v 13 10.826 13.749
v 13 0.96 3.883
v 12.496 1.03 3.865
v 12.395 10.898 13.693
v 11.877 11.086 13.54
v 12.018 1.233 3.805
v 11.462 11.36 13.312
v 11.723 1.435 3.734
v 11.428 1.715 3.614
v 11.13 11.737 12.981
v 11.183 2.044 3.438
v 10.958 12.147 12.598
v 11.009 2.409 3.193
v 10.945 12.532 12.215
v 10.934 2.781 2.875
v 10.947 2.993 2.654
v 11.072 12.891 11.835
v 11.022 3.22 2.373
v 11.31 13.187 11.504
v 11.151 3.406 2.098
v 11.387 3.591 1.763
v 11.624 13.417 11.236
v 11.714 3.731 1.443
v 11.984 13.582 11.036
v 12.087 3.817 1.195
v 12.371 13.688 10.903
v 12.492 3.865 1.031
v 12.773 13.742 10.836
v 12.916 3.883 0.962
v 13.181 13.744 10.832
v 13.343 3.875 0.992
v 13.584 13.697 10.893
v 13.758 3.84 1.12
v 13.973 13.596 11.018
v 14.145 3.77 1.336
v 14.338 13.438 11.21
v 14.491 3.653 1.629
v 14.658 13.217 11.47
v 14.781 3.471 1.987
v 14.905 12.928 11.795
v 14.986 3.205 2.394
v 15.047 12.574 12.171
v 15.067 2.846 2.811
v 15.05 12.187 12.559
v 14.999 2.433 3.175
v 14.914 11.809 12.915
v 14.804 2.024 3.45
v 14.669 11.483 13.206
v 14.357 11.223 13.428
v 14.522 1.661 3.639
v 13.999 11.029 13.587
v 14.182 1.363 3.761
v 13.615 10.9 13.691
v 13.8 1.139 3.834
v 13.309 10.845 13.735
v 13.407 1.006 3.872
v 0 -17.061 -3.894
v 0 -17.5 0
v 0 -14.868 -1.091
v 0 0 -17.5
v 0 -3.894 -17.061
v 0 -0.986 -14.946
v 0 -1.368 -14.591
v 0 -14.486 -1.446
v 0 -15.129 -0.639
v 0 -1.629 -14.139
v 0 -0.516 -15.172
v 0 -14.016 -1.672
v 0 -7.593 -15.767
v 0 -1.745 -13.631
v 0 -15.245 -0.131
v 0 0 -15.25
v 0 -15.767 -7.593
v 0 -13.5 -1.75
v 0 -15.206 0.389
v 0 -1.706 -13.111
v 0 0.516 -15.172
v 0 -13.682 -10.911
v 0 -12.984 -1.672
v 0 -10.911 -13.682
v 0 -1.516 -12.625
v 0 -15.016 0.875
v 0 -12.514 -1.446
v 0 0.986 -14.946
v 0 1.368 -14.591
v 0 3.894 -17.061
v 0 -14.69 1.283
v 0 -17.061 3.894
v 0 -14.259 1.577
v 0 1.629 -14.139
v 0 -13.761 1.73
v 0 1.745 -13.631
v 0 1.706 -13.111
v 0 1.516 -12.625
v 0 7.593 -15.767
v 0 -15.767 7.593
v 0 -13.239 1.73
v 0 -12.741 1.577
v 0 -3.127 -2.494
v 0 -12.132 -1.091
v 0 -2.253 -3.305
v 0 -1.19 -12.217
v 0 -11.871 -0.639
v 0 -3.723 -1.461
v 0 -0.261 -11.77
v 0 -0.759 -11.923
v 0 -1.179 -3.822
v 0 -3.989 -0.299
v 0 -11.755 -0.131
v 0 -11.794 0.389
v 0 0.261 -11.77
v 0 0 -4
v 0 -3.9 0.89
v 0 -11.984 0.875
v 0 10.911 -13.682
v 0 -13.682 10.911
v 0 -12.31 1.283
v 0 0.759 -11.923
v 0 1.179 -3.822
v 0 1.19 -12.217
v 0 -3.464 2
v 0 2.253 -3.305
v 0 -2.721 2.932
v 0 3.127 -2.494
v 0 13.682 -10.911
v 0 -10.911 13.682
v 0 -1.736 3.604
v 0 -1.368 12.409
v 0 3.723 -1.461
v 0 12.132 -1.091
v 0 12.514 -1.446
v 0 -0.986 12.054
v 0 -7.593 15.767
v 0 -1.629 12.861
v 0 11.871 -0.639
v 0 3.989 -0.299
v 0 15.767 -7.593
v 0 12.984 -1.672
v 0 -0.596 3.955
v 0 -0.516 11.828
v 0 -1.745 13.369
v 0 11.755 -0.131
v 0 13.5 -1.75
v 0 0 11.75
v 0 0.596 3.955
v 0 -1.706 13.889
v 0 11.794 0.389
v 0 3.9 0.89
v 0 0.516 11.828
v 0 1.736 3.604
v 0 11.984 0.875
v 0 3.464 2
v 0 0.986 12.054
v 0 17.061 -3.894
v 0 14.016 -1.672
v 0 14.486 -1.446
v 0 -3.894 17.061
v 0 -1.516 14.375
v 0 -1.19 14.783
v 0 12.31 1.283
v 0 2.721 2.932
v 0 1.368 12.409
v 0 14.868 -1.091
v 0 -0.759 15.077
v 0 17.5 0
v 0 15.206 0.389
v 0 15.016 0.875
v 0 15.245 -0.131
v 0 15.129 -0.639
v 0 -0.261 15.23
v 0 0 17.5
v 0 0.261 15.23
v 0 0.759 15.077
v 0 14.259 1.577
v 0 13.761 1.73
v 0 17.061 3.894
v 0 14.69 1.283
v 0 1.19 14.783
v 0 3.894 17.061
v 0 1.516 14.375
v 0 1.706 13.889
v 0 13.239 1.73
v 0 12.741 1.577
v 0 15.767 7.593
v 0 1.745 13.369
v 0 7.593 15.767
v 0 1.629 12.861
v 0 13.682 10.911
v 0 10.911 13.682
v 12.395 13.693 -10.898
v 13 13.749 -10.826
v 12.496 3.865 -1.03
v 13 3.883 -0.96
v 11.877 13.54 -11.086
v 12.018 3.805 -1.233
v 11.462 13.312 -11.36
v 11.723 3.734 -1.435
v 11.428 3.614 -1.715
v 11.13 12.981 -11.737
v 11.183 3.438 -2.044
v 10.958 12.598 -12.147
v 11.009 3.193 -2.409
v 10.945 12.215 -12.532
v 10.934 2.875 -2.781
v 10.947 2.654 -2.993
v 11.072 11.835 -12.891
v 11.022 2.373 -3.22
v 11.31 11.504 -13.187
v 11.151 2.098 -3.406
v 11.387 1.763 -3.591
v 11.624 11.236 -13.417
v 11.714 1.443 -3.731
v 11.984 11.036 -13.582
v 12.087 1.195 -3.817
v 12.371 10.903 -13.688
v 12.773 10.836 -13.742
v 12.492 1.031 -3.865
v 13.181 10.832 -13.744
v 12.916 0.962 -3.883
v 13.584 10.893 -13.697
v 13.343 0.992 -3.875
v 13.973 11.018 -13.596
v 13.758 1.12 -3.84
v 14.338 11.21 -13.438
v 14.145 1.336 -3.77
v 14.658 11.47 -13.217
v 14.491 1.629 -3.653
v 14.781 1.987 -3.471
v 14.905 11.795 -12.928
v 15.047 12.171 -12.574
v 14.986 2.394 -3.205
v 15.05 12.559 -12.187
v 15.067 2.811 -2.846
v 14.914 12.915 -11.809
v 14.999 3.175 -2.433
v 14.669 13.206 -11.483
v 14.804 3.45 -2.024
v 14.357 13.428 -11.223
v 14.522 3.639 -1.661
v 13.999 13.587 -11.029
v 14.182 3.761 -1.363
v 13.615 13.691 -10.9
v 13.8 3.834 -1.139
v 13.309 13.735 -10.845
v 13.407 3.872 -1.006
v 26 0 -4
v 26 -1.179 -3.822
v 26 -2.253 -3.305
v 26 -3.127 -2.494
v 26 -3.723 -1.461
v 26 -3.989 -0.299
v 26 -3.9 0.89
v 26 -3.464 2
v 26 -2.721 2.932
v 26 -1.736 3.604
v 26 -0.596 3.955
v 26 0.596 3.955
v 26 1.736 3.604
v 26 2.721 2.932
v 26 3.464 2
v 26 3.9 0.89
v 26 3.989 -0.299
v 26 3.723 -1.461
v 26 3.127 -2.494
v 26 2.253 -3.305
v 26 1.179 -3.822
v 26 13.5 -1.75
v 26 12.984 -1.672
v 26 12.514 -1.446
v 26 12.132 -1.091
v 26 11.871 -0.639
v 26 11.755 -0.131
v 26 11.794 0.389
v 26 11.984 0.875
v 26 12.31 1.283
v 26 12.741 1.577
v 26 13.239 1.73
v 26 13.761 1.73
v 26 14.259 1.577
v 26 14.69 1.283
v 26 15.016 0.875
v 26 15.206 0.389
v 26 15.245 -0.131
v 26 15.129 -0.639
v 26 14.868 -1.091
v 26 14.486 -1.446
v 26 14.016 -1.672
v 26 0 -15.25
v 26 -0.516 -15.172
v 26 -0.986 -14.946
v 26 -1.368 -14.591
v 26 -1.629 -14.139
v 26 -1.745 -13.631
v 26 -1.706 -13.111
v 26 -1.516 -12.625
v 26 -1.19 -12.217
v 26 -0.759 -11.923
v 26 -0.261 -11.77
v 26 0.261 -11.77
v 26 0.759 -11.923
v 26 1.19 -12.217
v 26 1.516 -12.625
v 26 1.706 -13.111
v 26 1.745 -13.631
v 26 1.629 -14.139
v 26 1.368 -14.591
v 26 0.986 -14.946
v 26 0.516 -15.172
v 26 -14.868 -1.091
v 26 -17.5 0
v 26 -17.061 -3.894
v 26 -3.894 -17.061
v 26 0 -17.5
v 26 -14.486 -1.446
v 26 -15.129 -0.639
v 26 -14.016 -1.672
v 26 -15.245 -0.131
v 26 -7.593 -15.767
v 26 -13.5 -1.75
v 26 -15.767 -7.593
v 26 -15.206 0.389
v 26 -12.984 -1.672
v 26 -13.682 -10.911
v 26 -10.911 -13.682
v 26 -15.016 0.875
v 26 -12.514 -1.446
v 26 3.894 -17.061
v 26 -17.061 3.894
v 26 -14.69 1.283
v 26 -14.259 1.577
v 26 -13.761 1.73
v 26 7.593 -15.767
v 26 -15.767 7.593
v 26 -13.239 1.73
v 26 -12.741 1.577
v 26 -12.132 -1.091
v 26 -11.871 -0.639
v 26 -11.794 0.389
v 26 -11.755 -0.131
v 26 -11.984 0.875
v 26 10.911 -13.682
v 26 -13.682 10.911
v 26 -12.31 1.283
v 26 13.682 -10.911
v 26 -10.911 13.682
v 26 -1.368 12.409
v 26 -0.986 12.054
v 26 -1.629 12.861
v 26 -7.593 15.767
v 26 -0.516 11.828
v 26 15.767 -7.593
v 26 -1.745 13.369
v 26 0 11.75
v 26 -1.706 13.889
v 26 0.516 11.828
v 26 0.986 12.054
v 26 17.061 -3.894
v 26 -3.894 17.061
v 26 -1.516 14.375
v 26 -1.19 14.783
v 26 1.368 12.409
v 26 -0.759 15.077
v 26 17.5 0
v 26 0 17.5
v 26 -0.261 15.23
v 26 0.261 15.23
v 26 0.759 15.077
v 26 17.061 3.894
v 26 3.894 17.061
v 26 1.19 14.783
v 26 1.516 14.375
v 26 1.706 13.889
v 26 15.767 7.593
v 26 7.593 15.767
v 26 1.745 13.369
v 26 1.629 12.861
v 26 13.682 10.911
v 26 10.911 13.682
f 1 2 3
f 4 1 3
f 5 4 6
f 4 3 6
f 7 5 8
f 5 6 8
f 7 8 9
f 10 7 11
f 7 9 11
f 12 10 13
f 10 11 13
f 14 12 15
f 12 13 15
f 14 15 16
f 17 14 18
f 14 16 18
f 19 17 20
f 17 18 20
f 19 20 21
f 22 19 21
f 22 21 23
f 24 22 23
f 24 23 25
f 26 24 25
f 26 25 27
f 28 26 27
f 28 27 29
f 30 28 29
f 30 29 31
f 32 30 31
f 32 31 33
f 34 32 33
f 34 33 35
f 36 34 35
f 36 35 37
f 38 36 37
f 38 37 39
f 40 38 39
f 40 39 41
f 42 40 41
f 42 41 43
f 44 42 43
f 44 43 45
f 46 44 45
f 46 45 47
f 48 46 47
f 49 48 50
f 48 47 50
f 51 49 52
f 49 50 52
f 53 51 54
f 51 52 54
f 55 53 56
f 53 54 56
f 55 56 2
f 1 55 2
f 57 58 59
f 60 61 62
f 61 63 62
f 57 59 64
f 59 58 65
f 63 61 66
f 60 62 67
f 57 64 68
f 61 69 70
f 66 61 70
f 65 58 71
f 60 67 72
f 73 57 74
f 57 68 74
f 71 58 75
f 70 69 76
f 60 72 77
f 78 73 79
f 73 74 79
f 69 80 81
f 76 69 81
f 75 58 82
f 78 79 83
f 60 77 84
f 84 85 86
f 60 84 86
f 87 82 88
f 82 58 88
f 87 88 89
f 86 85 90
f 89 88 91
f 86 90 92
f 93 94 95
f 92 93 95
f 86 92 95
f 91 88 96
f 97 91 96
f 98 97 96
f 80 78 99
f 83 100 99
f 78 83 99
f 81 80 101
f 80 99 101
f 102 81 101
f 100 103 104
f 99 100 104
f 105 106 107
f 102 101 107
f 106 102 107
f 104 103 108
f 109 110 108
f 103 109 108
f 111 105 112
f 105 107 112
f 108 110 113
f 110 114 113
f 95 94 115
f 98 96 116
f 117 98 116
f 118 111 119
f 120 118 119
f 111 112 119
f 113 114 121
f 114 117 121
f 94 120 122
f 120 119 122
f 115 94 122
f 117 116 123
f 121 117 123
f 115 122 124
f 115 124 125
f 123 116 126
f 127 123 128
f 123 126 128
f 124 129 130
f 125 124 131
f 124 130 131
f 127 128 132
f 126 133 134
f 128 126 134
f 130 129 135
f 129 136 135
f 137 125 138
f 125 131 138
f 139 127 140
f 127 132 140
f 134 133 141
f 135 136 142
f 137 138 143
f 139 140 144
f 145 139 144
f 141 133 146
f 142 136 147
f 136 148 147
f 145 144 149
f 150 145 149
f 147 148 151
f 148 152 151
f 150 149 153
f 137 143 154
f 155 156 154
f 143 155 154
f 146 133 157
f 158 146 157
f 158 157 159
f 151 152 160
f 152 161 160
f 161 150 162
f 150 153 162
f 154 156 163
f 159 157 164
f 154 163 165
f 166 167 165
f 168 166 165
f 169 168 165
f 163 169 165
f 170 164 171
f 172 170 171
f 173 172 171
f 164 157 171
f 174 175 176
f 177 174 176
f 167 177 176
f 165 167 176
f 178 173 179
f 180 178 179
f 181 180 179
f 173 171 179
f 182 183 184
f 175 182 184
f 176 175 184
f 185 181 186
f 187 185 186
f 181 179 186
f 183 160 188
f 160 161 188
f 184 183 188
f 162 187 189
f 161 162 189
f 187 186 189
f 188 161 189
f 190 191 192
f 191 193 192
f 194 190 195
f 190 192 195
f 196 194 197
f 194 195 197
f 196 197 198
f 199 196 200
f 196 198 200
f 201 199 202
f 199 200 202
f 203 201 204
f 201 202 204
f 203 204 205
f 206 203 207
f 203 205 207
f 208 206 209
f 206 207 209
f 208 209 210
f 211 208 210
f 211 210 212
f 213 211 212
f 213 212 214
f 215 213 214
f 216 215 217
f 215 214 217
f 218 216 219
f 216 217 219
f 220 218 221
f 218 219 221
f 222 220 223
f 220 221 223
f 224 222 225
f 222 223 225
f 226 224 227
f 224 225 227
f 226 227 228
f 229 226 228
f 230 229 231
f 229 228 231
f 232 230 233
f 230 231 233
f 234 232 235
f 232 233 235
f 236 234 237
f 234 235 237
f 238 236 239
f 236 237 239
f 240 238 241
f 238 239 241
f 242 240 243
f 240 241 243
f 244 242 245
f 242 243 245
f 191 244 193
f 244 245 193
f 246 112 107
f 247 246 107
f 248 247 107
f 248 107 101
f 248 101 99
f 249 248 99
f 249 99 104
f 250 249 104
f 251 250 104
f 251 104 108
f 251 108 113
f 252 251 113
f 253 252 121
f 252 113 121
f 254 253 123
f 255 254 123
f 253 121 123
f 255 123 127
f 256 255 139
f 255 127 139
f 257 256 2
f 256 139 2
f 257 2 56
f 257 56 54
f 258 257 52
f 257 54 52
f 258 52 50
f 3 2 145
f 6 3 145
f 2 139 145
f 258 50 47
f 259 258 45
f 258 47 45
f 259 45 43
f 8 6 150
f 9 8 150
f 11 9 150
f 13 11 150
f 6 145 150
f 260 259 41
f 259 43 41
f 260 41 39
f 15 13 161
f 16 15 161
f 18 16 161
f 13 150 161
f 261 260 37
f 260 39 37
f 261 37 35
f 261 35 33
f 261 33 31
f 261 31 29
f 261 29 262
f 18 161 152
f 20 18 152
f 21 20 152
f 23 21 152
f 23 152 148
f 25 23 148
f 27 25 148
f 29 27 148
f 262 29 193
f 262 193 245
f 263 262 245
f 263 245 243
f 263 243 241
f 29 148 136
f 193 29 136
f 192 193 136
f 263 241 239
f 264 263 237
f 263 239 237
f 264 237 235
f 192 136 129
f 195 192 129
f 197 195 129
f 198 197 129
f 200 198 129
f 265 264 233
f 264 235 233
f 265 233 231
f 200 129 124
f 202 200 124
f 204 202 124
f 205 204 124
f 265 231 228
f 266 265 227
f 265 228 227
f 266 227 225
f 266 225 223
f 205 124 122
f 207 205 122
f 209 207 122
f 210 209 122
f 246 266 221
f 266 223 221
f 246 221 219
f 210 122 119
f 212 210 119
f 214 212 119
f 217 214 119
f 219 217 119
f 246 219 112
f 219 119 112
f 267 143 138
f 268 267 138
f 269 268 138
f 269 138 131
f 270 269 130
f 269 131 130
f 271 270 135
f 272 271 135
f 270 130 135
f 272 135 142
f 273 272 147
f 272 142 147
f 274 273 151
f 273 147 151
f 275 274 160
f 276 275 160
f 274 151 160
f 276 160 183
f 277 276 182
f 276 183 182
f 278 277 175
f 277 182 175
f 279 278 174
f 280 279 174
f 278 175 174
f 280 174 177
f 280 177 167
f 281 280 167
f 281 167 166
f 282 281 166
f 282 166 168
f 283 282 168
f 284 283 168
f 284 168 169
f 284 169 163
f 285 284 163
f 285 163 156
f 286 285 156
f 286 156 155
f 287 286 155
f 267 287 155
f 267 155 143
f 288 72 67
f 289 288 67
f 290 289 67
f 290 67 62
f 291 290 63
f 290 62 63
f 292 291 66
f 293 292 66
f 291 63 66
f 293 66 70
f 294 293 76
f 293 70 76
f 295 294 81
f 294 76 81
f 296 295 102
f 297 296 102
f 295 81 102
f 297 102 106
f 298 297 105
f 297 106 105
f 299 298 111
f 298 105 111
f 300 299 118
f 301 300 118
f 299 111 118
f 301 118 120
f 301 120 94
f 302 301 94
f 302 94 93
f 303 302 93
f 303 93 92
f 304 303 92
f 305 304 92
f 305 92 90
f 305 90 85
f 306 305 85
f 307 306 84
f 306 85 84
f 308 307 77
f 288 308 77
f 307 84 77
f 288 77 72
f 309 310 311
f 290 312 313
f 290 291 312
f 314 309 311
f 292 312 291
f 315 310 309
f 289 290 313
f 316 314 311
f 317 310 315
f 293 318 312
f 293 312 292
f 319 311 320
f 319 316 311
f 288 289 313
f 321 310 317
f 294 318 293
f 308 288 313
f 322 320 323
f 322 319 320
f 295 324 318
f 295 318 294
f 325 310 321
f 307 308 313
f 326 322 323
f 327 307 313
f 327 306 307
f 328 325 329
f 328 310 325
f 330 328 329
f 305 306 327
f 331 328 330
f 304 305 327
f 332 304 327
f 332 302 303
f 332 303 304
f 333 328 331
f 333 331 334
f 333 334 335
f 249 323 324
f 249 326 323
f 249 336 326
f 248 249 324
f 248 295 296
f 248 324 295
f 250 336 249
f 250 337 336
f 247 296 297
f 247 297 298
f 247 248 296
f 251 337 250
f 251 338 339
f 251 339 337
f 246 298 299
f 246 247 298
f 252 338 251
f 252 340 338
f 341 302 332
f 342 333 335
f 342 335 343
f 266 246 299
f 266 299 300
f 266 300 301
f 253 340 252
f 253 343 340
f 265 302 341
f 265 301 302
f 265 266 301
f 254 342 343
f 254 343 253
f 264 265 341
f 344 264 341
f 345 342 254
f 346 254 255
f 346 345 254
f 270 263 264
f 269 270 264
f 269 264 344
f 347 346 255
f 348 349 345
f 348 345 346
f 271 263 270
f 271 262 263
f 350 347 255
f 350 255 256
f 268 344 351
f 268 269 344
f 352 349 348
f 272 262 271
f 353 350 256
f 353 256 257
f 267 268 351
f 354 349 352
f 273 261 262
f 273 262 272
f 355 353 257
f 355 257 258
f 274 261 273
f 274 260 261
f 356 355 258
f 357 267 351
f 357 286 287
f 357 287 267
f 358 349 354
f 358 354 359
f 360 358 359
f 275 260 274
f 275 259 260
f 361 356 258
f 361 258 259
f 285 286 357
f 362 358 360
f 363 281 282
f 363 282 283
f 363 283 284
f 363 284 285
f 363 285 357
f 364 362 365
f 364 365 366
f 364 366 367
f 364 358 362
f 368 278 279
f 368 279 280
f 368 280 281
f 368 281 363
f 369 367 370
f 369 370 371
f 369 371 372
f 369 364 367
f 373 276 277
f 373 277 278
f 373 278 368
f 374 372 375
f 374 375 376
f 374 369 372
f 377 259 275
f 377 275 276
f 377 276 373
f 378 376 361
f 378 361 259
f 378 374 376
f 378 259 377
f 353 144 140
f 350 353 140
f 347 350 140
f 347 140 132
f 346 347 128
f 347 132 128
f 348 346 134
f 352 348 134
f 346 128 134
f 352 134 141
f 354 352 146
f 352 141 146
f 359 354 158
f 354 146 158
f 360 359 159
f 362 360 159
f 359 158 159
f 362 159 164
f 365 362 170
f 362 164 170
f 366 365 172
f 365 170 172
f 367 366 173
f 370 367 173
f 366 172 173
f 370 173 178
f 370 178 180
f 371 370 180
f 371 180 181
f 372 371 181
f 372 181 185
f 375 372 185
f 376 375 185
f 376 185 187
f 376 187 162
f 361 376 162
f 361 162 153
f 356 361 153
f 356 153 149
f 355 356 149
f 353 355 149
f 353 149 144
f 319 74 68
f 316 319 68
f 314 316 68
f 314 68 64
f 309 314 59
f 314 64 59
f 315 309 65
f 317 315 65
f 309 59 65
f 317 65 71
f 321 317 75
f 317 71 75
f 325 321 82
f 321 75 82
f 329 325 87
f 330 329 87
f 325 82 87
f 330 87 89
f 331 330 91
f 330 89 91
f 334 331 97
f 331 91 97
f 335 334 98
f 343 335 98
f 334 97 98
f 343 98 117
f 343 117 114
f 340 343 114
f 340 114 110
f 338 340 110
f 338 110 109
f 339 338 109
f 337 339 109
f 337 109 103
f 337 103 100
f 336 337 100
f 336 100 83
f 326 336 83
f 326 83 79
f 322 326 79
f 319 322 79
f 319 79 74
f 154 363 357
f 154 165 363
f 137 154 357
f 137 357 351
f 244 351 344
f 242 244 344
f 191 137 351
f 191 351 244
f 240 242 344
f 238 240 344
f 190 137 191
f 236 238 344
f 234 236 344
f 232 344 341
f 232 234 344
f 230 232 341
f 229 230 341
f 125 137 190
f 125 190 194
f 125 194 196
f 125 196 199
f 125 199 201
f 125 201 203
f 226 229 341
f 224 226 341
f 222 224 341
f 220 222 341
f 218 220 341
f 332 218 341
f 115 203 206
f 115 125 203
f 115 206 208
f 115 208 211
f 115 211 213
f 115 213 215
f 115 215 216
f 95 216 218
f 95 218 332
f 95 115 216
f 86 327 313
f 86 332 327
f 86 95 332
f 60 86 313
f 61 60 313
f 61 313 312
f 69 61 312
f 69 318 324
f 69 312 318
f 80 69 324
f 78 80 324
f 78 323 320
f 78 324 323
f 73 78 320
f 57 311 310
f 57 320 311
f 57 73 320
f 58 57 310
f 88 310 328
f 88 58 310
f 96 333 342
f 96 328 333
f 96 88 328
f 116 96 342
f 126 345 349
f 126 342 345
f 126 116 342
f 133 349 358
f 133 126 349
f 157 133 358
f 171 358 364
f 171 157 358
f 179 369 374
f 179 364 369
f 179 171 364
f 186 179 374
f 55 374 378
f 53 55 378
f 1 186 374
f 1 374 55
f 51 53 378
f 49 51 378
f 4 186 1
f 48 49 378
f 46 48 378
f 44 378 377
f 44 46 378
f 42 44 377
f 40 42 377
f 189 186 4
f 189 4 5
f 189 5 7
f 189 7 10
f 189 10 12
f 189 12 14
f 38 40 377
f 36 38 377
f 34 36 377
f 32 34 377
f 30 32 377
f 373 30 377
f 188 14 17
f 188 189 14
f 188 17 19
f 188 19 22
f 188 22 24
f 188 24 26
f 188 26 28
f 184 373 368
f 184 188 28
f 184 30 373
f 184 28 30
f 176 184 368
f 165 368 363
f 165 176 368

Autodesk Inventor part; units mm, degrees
ref_plane "YZ Plane" through (0, 0, 0) normal (1, 0, 0) x (0, 1, 0)
sketch "Szkic1" plane through (0, 0, 0) normal (1, 0, 0) x (0, 1, 0)
  circle A0 centre (0, 0) radius 17.5
  dimension "d0" = 35
extrude "Wyciągnięcie proste1" add sketch "Szkic1" along normal blind 26
sketch "Szkic2" plane through (26, 0, 0) normal (1, 0, 0) x (0, 0, -1)
  point P0 (0, 0)
  point P1 (0, 0)
hole "Otwór1" at (26, 0, 0) direction (-1, 0, 0) diameter 8 end through all
sketch "Szkic3" plane through (26, 0, 0) normal (1, 0, 0) x (0, 0, -1)
  point P0 (0, 0)
  point P1 (13.5, 0)
  point P2 (0, 13.5)
  point P3 (-13.5, 0)
  point P4 (0, -13.5)
  dimension "d10" = 13.5
  dimension "d13" = 360
hole "Otwór2" at (26, 0, -13.5) at (26, 13.5, 0) at (26, 0, 13.5) at (26, -13.5, 0) direction (-1, 0, 0) diameter 3.5 depth 26 tip angle 118
sketch "Szkic4" plane through (26, 0, 0) normal (1, 0, 0) x (0, 0, -1)
  line L0 (0, 0) -> (-12.3744, 12.3744)
  line L1 (0, 0) -> (17.5, 0) construction
  line L2 (0, 0) -> (12.3744, 12.3744)
  line L3 (0, 0) -> (17.5, 0) construction
  dimension "d22" = 17.5
  dimension "d23" = 135
  dimension "d24" = 17.5
  dimension "d25" = 45
ref_plane "Płaszczyzna konstrukcyjna1" through (26, 12.3744, 12.3744) normal (0, 0.7071068, 0.7071068) x (-1, 0, 0)
ref_plane "Płaszczyzna konstrukcyjna2" through (26, 12.3744, -12.3744) normal (0, 0.7071068, -0.7071068) x (-1, 0, 0)
sketch "Szkic10" plane through (26, 12.3744, 12.3744) normal (0, 0.7071068, 0.7071068) x (-1, 0, 0)
  line L0 (26, -17.5) -> (26, 17.5) projected
  line L1 (0, 17.5) -> (0, -17.5) projected
  line L2 (26, 17.5) -> (0, 17.5) projected
  line L3 (26, -17.5) -> (0, -17.5) projected
  point P0 (26, 0)
  point P1 (13, 0)
  dimension "d54" = 13
  dimension "d55" = 26
  dimension "d56" = 35
  dimension "d57" = 17.5
hole "Otwór5" at (13, 12.3744, 12.3744) direction (0, -0.7071068, -0.7071068) diameter 4.134 end up to surface thread size "M5x0.8" class "6H" standard "ANSI Metric M Profile"
sketch "Szkic12" plane through (26, 12.3744, -12.3744) normal (0, 0.7071068, -0.7071068) x (-1, 0, 0)
  line L0 (26, 17.5) -> (0, 17.5) projected
  line L1 (26, -17.5) -> (26, 17.5) projected
  line L2 (26, -17.5) -> (0, -17.5) projected
  line L3 (0, 17.5) -> (0, -17.5) projected
  point P0 (26, 0)
  point P1 (13, 0)
  dimension "d67" = 35
  dimension "d68" = 26
  dimension "d69" = 13
  dimension "d70" = 17.5
hole "Otwór6" at (13, 12.3744, -12.3744) direction (0, -0.7071068, 0.7071068) diameter 4.134 end up to surface thread size "M5x0.8" class "6H" standard "ANSI Metric M Profile"
equation "\"d0\" = radius"
equation "\"d16\" = d1"
equation "\"d20\" = d1"
equation "\"d22\" = 0.5 * radius"
equation "\"d24\" = d22"
equation "\"d54\" = 0.5 * d55"
equation "\"d57\" = 0.5 * d56"
equation "\"d69\" = 0.5 * d68"
equation "\"d70\" = 0.5 * d67"
equation "\"radius\" = 35"
equation "\"d1\" = 26"
properties part number "piasta_kola_napedowego_fi8" material "Aluminum 6061"
